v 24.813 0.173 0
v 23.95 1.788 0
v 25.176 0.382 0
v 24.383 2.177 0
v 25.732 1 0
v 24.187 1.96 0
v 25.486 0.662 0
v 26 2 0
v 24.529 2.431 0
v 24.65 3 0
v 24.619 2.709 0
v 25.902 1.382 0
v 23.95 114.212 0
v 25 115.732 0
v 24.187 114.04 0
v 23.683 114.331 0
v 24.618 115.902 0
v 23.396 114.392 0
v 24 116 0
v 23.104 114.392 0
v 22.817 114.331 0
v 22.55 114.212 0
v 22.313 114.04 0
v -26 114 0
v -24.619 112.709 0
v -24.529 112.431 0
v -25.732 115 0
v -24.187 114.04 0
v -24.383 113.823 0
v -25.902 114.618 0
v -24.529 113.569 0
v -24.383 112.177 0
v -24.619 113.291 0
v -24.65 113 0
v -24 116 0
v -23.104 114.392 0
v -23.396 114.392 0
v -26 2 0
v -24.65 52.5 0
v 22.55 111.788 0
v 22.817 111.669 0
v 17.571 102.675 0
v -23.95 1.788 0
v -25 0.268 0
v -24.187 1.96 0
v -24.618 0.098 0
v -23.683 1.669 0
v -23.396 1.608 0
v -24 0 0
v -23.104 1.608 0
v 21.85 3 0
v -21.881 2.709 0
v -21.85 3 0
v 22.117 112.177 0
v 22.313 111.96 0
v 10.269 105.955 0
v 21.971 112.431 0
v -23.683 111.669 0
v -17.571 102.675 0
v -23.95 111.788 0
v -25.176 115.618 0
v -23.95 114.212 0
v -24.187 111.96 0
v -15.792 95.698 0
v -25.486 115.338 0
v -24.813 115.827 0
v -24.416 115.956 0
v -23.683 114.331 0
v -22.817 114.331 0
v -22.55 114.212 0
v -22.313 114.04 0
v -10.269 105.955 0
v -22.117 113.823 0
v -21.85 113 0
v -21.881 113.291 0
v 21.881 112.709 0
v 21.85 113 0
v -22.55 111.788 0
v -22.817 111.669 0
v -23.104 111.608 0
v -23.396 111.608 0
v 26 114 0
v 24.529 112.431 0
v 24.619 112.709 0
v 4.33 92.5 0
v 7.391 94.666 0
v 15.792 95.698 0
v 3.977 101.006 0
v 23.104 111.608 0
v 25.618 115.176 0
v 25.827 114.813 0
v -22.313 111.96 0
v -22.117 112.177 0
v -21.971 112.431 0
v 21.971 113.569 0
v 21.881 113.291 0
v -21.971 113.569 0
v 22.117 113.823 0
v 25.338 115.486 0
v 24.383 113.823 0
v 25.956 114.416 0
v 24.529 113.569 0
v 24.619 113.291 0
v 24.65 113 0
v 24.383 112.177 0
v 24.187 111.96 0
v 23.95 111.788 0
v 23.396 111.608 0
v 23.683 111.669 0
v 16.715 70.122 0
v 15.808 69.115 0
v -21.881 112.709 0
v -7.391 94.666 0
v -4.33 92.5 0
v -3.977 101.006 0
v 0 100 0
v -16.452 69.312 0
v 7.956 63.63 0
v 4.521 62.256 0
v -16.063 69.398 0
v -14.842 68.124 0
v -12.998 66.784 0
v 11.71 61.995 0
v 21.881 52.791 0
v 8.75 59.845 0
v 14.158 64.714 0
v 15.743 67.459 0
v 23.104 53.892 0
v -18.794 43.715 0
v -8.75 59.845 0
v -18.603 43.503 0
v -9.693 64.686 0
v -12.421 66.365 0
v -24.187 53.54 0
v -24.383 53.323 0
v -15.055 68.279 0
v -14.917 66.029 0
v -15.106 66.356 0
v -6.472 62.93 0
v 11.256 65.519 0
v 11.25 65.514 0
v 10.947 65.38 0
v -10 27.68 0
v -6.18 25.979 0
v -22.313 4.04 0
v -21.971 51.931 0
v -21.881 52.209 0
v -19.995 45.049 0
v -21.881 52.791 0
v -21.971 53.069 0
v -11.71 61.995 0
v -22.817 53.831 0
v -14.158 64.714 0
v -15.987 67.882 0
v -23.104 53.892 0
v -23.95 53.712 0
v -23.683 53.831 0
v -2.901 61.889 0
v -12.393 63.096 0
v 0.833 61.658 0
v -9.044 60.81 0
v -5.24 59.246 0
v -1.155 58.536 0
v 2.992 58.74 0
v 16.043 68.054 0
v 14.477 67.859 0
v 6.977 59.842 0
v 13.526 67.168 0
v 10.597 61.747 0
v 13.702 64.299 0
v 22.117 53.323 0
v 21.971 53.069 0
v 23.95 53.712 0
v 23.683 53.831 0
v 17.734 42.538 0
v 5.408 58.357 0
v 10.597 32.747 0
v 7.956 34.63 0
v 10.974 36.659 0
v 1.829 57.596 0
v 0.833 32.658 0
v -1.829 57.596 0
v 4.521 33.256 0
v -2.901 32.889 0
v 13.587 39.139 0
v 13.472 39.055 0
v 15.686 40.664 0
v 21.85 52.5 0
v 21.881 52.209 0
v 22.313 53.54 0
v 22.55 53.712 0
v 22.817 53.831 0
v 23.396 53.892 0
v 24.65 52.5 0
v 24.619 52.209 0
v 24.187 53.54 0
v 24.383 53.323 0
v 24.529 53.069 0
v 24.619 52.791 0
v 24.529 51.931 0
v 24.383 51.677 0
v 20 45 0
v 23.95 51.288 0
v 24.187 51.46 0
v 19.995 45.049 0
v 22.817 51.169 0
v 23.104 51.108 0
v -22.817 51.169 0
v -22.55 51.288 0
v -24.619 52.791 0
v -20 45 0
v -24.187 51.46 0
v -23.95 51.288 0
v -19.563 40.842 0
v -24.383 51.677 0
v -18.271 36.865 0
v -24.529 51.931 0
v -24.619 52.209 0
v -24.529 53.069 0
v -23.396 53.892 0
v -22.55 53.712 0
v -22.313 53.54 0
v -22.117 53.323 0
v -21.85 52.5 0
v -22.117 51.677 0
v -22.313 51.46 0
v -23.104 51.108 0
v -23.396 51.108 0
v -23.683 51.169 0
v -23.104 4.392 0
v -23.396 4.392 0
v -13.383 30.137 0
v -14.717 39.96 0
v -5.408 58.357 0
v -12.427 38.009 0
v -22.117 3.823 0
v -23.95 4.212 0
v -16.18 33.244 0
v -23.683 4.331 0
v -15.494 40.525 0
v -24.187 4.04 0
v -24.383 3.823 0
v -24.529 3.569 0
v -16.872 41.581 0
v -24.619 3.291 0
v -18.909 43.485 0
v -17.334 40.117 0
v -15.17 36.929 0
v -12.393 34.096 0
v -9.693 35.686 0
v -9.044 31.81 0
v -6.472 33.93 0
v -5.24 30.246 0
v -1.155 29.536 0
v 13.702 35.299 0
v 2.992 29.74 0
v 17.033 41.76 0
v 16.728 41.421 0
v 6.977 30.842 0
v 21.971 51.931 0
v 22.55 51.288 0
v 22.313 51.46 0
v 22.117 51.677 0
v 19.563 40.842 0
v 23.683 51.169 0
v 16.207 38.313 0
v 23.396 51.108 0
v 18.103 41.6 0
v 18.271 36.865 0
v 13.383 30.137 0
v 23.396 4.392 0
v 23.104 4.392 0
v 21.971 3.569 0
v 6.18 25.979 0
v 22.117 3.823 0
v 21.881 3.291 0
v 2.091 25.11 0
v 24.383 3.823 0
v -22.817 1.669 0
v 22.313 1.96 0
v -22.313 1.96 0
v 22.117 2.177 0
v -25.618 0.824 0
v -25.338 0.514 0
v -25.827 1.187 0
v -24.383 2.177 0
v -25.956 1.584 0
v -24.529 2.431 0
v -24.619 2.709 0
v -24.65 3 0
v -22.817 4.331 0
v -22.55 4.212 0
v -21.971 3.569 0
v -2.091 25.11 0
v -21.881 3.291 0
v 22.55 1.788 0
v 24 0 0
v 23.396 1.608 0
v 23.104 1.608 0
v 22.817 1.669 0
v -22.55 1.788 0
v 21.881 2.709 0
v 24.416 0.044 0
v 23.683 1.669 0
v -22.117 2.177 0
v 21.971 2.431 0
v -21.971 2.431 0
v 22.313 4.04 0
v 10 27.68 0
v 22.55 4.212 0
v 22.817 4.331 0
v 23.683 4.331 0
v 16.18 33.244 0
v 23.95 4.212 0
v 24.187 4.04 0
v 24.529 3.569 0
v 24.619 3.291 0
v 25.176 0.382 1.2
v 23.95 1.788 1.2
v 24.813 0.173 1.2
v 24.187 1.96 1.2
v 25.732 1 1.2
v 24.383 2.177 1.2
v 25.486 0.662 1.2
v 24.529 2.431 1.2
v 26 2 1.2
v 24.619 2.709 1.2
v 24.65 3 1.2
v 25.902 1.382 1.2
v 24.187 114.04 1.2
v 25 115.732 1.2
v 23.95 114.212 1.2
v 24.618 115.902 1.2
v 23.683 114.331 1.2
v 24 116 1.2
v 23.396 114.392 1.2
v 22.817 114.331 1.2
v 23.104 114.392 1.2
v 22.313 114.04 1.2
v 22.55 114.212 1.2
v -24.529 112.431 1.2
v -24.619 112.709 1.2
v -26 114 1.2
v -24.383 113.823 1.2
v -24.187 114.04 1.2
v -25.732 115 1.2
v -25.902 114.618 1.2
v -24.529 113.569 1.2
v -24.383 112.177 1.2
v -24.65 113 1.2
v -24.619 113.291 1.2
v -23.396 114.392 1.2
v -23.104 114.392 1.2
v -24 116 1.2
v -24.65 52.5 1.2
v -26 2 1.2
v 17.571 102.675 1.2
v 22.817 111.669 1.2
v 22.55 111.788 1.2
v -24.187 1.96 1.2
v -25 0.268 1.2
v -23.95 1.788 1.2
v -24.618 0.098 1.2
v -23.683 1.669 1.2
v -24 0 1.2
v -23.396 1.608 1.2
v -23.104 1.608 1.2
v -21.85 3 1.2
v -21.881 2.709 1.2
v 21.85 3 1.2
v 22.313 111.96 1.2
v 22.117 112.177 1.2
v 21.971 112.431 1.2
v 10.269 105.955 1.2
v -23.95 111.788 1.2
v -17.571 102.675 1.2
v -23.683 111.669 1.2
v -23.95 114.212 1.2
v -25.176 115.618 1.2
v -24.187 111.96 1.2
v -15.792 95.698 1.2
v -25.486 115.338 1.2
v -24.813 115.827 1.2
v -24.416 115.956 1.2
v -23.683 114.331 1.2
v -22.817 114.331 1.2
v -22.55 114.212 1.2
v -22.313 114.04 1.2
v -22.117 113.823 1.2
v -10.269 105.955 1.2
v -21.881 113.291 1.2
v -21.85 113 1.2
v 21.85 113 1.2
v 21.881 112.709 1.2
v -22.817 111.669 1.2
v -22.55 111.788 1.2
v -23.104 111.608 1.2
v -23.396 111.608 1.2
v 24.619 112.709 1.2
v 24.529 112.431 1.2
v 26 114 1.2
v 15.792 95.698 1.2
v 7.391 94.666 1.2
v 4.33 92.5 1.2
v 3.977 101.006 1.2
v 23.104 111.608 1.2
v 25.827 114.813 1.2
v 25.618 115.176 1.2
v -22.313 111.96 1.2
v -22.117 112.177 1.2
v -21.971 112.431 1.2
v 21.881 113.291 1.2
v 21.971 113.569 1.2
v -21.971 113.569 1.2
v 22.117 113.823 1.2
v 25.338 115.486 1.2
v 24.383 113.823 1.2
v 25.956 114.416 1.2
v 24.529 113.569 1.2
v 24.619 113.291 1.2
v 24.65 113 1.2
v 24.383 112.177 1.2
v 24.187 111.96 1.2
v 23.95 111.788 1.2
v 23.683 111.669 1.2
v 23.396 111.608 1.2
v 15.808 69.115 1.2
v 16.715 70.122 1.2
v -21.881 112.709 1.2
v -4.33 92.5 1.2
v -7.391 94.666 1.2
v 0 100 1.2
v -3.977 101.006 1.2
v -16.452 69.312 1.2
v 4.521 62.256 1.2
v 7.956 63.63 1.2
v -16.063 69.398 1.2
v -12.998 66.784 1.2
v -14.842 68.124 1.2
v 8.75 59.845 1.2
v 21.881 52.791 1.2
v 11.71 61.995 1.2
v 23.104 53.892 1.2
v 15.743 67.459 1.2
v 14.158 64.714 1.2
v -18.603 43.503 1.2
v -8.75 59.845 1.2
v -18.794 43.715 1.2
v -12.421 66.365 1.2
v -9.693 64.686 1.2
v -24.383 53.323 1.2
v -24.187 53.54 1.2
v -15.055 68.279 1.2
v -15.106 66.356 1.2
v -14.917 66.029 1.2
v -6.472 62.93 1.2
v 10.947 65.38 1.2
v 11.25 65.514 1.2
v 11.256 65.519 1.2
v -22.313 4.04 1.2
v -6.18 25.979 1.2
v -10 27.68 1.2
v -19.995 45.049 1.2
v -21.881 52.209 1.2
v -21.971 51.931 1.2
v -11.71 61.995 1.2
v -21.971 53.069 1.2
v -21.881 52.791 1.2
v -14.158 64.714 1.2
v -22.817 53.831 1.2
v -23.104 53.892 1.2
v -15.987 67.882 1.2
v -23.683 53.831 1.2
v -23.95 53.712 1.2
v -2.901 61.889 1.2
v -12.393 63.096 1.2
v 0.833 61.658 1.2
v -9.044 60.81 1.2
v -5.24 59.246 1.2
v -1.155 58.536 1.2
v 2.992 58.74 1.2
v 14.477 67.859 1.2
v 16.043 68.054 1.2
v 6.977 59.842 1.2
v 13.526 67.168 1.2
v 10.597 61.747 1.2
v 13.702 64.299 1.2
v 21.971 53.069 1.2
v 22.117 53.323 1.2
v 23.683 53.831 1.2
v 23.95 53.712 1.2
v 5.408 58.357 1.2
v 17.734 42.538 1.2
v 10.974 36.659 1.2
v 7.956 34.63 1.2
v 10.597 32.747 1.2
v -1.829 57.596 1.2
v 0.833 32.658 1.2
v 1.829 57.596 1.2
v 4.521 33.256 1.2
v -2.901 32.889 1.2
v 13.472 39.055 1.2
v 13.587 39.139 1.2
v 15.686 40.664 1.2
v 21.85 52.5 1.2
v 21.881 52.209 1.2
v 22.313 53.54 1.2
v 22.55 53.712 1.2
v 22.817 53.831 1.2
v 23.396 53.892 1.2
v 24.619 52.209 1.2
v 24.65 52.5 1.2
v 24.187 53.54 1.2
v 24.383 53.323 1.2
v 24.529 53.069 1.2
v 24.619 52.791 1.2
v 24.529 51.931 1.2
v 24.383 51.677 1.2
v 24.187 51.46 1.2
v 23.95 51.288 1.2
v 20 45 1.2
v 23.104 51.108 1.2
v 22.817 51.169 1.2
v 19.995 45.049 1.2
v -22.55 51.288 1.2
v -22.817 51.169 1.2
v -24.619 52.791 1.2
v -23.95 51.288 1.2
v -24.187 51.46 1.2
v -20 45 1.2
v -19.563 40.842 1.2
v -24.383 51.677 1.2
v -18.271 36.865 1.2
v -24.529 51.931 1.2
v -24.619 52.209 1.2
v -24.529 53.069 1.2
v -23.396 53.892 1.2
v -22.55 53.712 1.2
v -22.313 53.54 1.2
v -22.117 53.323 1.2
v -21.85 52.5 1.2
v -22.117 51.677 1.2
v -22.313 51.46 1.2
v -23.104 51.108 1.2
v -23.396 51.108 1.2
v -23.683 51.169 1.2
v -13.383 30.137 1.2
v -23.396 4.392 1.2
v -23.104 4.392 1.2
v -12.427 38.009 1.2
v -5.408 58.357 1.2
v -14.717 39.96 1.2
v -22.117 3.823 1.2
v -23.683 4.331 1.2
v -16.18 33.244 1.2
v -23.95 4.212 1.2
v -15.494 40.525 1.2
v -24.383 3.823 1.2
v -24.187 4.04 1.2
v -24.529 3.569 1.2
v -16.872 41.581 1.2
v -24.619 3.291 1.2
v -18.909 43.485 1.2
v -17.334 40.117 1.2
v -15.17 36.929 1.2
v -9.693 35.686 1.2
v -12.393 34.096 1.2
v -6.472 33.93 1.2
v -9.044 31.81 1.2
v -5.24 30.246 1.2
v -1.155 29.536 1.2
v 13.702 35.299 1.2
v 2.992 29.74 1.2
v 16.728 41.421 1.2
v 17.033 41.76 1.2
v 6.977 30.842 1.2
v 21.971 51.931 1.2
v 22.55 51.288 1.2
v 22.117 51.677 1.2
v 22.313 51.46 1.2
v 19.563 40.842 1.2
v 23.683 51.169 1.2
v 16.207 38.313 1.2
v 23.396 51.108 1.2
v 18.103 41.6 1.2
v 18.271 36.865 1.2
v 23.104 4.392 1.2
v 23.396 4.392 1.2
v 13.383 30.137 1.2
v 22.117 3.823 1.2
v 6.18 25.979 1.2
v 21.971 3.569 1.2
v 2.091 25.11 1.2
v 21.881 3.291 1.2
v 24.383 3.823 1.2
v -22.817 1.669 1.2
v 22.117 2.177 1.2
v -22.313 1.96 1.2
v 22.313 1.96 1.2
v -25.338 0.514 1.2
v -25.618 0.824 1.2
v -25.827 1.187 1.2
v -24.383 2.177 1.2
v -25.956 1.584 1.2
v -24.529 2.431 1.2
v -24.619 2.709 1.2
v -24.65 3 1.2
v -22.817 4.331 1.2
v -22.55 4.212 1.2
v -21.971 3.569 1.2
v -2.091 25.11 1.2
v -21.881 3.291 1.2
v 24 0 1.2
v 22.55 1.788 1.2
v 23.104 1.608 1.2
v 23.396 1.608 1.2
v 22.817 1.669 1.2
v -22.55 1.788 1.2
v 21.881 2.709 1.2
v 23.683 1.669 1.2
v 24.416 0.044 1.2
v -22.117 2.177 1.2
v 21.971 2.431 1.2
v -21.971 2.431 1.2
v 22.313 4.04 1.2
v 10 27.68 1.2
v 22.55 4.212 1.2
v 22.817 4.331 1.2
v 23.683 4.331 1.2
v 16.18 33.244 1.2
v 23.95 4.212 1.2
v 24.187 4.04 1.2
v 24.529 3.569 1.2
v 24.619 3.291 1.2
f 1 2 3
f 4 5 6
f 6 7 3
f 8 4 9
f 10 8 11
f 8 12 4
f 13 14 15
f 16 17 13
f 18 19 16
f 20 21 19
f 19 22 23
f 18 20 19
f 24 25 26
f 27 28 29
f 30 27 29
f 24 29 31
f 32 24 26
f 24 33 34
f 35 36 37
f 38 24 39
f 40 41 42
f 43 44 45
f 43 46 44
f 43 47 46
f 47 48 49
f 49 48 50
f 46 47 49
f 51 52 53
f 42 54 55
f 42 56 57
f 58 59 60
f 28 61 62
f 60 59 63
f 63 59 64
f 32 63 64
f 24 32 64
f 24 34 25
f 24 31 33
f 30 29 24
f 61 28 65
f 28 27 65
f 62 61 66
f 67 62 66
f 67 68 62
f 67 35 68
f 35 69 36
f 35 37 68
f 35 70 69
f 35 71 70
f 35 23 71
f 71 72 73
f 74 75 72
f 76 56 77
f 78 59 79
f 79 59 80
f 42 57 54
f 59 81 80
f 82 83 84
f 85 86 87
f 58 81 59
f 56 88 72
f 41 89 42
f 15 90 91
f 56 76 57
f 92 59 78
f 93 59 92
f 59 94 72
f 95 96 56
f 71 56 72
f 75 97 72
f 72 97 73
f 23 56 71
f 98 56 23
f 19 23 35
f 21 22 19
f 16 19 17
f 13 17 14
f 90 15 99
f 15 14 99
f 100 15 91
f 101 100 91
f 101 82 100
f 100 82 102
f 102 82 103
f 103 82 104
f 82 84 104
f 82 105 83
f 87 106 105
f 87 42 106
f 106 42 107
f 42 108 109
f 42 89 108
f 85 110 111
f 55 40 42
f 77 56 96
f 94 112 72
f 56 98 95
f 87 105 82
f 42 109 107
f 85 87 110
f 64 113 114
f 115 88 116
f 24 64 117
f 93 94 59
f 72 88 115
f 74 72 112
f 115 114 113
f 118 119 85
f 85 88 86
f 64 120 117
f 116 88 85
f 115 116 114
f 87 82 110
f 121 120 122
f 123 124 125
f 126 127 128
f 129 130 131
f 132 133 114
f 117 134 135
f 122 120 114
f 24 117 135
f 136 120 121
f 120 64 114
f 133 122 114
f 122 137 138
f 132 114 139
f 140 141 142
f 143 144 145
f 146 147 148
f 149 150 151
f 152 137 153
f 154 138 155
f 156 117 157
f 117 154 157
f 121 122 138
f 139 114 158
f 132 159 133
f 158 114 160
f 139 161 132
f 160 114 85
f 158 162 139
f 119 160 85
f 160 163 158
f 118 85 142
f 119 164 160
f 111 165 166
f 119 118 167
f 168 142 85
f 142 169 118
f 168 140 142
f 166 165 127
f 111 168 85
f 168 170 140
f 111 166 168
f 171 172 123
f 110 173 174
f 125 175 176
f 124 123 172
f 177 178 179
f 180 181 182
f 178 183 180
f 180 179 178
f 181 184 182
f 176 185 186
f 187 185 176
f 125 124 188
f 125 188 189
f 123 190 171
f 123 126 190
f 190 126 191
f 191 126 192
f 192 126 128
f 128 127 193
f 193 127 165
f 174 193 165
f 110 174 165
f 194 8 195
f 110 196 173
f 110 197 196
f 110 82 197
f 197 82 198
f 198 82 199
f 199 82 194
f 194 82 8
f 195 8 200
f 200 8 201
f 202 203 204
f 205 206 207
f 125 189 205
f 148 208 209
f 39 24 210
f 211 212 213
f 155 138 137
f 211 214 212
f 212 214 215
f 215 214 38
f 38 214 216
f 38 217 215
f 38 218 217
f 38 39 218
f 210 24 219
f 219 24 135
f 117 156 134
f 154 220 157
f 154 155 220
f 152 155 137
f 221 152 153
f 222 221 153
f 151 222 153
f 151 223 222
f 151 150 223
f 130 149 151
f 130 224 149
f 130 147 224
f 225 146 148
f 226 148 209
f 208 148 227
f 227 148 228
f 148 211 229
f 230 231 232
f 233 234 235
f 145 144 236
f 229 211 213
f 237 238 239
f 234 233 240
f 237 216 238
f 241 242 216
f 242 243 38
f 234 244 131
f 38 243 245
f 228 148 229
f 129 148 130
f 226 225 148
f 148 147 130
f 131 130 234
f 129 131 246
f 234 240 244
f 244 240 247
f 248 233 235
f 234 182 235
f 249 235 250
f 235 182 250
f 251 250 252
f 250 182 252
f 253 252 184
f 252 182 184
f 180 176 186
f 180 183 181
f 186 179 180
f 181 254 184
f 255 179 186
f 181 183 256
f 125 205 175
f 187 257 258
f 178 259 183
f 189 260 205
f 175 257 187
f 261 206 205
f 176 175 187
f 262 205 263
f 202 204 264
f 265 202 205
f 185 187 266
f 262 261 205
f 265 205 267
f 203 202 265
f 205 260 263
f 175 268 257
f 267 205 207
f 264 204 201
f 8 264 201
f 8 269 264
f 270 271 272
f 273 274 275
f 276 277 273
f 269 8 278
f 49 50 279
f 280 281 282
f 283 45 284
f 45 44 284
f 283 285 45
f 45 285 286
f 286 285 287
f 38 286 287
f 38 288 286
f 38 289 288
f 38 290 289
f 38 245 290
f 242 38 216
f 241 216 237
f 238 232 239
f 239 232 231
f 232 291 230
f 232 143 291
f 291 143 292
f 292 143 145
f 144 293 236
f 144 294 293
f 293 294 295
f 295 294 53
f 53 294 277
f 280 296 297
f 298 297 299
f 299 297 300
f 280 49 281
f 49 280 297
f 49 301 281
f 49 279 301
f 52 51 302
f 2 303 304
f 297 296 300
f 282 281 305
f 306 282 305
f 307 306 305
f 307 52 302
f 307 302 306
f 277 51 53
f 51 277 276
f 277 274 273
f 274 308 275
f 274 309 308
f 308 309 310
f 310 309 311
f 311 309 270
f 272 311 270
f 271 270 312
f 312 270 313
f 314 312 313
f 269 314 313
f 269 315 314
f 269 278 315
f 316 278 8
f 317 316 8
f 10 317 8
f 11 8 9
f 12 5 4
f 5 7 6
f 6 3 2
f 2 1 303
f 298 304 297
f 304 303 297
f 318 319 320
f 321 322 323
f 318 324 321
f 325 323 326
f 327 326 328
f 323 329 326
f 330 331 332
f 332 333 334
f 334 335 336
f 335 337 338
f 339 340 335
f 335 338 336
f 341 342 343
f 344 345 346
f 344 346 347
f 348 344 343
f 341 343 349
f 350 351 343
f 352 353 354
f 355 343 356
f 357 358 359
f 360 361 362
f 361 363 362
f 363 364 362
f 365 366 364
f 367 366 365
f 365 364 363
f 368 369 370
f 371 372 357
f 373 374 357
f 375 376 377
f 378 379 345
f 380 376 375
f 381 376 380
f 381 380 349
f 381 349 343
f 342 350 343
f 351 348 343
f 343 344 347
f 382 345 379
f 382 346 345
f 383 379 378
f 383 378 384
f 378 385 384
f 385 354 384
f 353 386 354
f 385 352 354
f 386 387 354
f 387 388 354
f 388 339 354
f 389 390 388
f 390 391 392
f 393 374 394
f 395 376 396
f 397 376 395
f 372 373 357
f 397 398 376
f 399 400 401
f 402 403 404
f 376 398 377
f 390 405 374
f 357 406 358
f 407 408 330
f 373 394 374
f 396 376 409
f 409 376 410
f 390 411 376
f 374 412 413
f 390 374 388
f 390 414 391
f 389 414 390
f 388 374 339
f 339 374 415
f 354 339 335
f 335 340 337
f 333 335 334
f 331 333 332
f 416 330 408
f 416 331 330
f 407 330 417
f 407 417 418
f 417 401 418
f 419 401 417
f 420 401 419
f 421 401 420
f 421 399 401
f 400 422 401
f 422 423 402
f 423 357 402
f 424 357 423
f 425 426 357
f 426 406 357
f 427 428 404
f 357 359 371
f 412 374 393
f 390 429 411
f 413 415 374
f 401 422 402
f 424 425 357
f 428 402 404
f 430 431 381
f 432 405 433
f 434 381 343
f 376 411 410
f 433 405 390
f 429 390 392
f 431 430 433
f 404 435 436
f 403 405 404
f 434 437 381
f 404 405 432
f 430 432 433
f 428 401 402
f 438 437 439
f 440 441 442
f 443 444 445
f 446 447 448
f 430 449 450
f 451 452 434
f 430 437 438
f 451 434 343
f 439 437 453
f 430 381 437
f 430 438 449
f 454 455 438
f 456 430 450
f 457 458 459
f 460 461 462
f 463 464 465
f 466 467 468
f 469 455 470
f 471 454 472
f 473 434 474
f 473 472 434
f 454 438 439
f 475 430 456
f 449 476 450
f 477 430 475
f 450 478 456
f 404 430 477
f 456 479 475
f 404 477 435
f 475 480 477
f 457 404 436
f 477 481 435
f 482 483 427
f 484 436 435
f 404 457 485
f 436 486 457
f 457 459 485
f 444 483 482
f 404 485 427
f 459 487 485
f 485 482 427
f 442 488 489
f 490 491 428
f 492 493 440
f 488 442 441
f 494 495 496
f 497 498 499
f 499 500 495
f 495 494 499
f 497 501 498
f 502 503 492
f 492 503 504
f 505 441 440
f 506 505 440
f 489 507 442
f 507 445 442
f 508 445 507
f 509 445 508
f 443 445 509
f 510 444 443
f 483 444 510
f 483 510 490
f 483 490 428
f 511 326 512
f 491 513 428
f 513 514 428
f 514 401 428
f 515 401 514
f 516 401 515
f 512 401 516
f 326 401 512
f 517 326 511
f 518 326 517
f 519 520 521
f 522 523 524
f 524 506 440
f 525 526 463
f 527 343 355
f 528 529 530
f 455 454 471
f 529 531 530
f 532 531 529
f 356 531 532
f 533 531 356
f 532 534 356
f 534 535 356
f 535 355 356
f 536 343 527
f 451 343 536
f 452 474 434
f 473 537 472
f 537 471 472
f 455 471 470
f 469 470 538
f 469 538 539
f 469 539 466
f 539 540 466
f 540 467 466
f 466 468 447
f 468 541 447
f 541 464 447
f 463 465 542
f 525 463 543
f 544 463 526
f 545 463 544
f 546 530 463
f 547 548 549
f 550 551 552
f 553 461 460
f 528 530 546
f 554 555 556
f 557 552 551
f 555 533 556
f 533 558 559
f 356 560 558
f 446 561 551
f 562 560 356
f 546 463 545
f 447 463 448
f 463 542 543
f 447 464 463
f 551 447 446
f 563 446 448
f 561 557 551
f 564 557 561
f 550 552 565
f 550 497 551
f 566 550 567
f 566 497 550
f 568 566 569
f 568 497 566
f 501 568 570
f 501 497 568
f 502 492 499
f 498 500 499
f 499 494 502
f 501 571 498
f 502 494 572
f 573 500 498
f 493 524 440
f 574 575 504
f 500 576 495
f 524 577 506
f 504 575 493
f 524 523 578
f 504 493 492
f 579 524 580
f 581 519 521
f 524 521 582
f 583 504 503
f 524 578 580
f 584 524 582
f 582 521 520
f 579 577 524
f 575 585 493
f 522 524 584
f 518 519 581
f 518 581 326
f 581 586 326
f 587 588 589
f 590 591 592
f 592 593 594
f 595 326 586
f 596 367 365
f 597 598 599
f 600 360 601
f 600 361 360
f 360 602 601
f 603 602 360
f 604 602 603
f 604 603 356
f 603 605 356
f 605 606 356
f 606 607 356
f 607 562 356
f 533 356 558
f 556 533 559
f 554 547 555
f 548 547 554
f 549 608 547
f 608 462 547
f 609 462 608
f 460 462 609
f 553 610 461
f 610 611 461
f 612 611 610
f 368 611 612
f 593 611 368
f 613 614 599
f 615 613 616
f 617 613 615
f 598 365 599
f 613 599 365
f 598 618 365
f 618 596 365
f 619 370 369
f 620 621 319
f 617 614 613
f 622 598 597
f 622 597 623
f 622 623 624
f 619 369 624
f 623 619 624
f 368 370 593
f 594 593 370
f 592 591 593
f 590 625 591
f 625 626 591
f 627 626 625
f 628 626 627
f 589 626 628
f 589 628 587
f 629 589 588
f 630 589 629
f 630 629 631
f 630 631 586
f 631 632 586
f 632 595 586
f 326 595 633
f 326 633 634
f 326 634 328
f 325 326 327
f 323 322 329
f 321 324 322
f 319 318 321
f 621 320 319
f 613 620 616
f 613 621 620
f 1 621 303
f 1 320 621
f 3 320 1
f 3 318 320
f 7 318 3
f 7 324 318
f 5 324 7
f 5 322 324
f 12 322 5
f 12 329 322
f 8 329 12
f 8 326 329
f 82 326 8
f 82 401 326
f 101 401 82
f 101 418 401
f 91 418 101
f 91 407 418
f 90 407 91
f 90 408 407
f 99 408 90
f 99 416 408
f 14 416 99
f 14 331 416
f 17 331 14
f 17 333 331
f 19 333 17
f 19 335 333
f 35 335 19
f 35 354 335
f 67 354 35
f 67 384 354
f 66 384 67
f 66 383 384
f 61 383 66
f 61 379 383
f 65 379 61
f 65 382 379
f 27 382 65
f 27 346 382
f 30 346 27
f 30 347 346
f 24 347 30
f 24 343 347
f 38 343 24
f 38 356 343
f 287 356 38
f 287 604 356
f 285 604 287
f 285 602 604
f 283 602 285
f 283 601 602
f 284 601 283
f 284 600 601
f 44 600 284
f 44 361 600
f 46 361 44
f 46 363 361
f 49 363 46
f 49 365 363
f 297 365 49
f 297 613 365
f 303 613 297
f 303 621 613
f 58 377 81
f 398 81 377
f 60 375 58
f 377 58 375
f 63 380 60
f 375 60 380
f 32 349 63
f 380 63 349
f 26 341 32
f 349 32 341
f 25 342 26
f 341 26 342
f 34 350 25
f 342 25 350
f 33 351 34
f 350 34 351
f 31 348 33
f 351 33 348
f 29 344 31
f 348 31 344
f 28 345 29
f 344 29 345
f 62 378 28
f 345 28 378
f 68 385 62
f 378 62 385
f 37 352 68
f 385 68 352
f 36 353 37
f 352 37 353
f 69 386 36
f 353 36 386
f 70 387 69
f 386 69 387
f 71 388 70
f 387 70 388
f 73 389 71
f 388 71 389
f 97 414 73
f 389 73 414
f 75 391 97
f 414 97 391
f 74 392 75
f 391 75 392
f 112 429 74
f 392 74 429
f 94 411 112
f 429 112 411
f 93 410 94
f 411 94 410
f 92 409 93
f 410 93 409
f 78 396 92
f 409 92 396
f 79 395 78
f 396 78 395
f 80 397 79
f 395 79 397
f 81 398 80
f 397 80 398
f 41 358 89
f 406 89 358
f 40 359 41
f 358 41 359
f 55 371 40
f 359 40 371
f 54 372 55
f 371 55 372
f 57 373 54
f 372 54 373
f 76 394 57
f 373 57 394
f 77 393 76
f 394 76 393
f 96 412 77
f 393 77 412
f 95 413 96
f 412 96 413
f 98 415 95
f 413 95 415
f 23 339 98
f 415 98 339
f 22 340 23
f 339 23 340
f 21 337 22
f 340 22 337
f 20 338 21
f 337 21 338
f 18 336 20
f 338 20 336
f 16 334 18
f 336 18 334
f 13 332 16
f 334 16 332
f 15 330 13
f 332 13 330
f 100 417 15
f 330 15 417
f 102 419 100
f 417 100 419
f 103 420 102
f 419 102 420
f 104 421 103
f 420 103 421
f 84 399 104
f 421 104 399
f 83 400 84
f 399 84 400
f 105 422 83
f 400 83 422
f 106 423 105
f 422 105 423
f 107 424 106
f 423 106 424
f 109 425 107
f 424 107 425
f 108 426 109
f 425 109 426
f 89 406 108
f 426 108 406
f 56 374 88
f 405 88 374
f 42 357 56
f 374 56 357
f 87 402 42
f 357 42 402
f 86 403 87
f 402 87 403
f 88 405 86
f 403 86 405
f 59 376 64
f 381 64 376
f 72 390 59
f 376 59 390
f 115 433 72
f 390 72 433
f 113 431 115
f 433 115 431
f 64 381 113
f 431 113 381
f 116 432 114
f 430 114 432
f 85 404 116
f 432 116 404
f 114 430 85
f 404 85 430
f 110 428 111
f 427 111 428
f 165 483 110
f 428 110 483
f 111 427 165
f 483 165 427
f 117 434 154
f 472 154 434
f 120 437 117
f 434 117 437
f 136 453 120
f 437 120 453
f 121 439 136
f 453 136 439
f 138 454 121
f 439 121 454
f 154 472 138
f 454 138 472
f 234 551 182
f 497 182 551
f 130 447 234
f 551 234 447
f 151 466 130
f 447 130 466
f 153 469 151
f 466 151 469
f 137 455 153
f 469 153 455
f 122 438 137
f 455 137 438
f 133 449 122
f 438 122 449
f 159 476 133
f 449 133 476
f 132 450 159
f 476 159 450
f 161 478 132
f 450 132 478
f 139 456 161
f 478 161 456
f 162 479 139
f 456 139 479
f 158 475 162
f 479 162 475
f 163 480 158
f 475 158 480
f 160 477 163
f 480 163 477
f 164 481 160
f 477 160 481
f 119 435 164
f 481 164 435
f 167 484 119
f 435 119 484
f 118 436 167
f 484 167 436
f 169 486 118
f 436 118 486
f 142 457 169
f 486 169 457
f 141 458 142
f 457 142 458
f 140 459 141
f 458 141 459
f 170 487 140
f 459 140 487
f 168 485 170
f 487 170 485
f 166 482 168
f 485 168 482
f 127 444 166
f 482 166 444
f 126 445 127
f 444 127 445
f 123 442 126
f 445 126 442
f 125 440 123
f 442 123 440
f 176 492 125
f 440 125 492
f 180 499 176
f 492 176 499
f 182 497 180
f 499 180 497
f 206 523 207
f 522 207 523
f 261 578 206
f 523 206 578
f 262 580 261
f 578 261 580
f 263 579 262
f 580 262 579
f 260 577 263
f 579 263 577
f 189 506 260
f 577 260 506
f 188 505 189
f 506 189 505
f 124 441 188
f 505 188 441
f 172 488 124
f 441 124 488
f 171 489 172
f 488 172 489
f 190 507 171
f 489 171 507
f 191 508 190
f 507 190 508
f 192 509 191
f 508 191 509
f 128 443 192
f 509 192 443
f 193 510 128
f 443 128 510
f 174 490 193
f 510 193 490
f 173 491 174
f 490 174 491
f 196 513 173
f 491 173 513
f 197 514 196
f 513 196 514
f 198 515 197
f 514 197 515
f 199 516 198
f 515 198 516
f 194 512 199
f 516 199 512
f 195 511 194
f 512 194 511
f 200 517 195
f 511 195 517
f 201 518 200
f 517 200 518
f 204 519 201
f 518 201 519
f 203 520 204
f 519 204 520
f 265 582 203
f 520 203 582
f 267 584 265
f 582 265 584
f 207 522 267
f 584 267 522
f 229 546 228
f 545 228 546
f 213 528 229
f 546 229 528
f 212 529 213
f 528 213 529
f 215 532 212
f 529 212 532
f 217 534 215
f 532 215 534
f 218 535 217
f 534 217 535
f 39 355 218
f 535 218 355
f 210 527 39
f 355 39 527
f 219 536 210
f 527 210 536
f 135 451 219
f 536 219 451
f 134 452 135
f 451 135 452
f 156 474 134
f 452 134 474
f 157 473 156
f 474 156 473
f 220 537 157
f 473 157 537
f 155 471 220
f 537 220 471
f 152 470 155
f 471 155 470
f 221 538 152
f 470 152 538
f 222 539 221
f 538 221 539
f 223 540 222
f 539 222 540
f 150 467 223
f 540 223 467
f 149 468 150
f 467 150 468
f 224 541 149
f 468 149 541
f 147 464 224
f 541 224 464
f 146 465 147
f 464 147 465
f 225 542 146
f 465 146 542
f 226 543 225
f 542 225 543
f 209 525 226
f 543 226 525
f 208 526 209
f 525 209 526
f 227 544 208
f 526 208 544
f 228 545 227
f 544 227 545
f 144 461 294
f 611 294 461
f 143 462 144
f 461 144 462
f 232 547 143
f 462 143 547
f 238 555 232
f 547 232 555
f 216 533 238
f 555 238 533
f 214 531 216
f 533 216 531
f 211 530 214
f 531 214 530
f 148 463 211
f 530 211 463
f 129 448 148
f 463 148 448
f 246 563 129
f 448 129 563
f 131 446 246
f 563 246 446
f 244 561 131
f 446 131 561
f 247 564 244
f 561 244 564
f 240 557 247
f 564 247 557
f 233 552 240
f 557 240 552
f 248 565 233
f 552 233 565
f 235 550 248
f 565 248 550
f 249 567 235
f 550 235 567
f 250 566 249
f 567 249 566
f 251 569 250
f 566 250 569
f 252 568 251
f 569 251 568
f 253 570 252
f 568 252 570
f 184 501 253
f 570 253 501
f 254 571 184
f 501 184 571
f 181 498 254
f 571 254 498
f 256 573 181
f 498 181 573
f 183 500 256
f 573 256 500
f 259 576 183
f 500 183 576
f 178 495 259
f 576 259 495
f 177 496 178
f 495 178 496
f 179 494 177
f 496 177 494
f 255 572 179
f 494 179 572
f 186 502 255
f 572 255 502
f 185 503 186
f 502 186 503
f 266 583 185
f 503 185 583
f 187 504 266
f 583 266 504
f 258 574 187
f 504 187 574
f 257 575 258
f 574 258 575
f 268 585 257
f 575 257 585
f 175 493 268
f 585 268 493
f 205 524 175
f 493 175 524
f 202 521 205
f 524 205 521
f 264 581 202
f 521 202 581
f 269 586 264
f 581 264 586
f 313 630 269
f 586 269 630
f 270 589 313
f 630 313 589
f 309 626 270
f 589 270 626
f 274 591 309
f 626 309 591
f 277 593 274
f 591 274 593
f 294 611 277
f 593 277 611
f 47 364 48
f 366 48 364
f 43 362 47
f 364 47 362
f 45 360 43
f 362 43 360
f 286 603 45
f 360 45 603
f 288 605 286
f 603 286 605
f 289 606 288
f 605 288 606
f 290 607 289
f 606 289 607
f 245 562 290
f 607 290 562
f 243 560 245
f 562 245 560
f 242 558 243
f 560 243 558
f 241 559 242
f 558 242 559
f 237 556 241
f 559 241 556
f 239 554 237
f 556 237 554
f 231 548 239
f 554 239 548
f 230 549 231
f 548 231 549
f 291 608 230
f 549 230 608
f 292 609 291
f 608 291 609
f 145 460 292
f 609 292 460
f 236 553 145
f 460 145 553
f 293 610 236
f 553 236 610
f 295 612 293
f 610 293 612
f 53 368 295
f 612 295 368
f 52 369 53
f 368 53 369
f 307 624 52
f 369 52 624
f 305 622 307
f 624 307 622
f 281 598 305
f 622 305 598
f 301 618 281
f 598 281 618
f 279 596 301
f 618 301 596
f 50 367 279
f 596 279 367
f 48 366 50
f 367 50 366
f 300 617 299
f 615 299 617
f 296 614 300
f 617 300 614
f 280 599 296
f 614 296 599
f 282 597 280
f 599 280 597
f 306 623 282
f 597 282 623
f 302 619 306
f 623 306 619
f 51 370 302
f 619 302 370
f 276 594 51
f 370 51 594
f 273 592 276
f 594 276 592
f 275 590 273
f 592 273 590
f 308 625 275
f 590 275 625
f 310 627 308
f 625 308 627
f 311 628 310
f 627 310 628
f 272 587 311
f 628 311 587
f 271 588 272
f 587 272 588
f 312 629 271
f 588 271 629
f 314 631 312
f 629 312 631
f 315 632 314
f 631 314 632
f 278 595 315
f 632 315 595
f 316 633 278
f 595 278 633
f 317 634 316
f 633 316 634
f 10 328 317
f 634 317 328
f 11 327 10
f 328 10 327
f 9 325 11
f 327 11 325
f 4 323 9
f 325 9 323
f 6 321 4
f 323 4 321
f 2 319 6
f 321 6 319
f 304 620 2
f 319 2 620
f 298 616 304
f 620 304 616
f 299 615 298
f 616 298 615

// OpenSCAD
// Alternate shadow mask for Gemmy talking pumpkin
// Adrian McCarthy 2023-11-27

m2_free_d = 2.4;  // M2 screw "free fit" diameter

module shadow_mask(nozzle_d=0.4) {
    $fs = nozzle_d/2;

    mask_w = 52;
    mask_h = 116;
    mask_th = 1.2;  // original is only 0.65
    mask_r = 2;  // radius of rounded corners
    screw_dx = 46.5;
    screw_dy1 = 49.5;
    screw_dy2 = 60.5;
    
    // The LEDs are approximately 35, 75, and 95 mm up from the bottom.
    // We'll use those as the vertical offsets for the parts of the
    // faces.  Due to the projection angles, however, we need to bias
    // the open mouth shape up by 9 to 10 mm.
    eyeline_y = 95;  // approx
    mouthline_y1 = 75;  // approx
    mouthline_y2 = 35 + 10;  // approx
    
    // Derive vertical offsets for screw holes
    screw_y0 = (mask_h-(screw_dy1+screw_dy2))/2;
    screw_y1 = screw_y0 + screw_dy1;
    screw_y2 = screw_y1 + screw_dy2;
    
    module screw_pair() {
        d = m2_free_d + nozzle_d;
        translate([-screw_dx/2, 0]) circle(d=d);
        translate([ screw_dx/2, 0]) circle(d=d);
    }

    module rounded_rect(w, h, r, center=false) {
        nudge = center ? [0, 0] : [r, r];
        offset(r=r)
            translate(nudge)
                square([w-2*r, h-2*r], center=center);
    }

    module blank_plate() {
        difference() {
            translate([-mask_w/2, 0]) rounded_rect(mask_w, mask_h, mask_r);
            translate([0, screw_y0]) screw_pair();
            translate([0, screw_y1]) screw_pair();
            translate([0, screw_y2]) screw_pair();
        }
    }
    
    module eyes() {
        module eye() {
            translate([11, 0])
                rotate([0, 0, 97]) scale([1.0, 1.2]) circle(d=12, $fn=5);
        }
        
        translate([0, 5]) {
            eye();
            mirror([1, 0, 0]) eye();
        }
        rotate([0, 0, 90]) circle(d=10, $fn=3);
    }
    
    module teeth() {
        for (i=[-7:6]) {
            theta = 9*(i+0.5) + 2;
            q = cos(abs(theta));
            d = 11*q*q;
            rotate([0, 0, theta-90])
                translate([42/2, 0])
                    circle(d=d, $fn=3);
        }
    }
    
    module neutral_mouth() {
        difference() {
            circle(d=35);
            translate([0, 10]) circle(d=45);
            translate([0, 10]) teeth();
        }
    }
    
    module big_mouth() {
        difference() {
            circle(d=40);
            translate([0, 15]) circle(d=50);
            translate([0, 11]) teeth();
        }
    }
    
    linear_extrude(mask_th, convexity=10) {
        difference() {
            blank_plate();
            translate([0, eyeline_y]) eyes();
            translate([0, mouthline_y1]) neutral_mouth();
            translate([0, mouthline_y2]) big_mouth();
        }
    }
}

shadow_mask();
